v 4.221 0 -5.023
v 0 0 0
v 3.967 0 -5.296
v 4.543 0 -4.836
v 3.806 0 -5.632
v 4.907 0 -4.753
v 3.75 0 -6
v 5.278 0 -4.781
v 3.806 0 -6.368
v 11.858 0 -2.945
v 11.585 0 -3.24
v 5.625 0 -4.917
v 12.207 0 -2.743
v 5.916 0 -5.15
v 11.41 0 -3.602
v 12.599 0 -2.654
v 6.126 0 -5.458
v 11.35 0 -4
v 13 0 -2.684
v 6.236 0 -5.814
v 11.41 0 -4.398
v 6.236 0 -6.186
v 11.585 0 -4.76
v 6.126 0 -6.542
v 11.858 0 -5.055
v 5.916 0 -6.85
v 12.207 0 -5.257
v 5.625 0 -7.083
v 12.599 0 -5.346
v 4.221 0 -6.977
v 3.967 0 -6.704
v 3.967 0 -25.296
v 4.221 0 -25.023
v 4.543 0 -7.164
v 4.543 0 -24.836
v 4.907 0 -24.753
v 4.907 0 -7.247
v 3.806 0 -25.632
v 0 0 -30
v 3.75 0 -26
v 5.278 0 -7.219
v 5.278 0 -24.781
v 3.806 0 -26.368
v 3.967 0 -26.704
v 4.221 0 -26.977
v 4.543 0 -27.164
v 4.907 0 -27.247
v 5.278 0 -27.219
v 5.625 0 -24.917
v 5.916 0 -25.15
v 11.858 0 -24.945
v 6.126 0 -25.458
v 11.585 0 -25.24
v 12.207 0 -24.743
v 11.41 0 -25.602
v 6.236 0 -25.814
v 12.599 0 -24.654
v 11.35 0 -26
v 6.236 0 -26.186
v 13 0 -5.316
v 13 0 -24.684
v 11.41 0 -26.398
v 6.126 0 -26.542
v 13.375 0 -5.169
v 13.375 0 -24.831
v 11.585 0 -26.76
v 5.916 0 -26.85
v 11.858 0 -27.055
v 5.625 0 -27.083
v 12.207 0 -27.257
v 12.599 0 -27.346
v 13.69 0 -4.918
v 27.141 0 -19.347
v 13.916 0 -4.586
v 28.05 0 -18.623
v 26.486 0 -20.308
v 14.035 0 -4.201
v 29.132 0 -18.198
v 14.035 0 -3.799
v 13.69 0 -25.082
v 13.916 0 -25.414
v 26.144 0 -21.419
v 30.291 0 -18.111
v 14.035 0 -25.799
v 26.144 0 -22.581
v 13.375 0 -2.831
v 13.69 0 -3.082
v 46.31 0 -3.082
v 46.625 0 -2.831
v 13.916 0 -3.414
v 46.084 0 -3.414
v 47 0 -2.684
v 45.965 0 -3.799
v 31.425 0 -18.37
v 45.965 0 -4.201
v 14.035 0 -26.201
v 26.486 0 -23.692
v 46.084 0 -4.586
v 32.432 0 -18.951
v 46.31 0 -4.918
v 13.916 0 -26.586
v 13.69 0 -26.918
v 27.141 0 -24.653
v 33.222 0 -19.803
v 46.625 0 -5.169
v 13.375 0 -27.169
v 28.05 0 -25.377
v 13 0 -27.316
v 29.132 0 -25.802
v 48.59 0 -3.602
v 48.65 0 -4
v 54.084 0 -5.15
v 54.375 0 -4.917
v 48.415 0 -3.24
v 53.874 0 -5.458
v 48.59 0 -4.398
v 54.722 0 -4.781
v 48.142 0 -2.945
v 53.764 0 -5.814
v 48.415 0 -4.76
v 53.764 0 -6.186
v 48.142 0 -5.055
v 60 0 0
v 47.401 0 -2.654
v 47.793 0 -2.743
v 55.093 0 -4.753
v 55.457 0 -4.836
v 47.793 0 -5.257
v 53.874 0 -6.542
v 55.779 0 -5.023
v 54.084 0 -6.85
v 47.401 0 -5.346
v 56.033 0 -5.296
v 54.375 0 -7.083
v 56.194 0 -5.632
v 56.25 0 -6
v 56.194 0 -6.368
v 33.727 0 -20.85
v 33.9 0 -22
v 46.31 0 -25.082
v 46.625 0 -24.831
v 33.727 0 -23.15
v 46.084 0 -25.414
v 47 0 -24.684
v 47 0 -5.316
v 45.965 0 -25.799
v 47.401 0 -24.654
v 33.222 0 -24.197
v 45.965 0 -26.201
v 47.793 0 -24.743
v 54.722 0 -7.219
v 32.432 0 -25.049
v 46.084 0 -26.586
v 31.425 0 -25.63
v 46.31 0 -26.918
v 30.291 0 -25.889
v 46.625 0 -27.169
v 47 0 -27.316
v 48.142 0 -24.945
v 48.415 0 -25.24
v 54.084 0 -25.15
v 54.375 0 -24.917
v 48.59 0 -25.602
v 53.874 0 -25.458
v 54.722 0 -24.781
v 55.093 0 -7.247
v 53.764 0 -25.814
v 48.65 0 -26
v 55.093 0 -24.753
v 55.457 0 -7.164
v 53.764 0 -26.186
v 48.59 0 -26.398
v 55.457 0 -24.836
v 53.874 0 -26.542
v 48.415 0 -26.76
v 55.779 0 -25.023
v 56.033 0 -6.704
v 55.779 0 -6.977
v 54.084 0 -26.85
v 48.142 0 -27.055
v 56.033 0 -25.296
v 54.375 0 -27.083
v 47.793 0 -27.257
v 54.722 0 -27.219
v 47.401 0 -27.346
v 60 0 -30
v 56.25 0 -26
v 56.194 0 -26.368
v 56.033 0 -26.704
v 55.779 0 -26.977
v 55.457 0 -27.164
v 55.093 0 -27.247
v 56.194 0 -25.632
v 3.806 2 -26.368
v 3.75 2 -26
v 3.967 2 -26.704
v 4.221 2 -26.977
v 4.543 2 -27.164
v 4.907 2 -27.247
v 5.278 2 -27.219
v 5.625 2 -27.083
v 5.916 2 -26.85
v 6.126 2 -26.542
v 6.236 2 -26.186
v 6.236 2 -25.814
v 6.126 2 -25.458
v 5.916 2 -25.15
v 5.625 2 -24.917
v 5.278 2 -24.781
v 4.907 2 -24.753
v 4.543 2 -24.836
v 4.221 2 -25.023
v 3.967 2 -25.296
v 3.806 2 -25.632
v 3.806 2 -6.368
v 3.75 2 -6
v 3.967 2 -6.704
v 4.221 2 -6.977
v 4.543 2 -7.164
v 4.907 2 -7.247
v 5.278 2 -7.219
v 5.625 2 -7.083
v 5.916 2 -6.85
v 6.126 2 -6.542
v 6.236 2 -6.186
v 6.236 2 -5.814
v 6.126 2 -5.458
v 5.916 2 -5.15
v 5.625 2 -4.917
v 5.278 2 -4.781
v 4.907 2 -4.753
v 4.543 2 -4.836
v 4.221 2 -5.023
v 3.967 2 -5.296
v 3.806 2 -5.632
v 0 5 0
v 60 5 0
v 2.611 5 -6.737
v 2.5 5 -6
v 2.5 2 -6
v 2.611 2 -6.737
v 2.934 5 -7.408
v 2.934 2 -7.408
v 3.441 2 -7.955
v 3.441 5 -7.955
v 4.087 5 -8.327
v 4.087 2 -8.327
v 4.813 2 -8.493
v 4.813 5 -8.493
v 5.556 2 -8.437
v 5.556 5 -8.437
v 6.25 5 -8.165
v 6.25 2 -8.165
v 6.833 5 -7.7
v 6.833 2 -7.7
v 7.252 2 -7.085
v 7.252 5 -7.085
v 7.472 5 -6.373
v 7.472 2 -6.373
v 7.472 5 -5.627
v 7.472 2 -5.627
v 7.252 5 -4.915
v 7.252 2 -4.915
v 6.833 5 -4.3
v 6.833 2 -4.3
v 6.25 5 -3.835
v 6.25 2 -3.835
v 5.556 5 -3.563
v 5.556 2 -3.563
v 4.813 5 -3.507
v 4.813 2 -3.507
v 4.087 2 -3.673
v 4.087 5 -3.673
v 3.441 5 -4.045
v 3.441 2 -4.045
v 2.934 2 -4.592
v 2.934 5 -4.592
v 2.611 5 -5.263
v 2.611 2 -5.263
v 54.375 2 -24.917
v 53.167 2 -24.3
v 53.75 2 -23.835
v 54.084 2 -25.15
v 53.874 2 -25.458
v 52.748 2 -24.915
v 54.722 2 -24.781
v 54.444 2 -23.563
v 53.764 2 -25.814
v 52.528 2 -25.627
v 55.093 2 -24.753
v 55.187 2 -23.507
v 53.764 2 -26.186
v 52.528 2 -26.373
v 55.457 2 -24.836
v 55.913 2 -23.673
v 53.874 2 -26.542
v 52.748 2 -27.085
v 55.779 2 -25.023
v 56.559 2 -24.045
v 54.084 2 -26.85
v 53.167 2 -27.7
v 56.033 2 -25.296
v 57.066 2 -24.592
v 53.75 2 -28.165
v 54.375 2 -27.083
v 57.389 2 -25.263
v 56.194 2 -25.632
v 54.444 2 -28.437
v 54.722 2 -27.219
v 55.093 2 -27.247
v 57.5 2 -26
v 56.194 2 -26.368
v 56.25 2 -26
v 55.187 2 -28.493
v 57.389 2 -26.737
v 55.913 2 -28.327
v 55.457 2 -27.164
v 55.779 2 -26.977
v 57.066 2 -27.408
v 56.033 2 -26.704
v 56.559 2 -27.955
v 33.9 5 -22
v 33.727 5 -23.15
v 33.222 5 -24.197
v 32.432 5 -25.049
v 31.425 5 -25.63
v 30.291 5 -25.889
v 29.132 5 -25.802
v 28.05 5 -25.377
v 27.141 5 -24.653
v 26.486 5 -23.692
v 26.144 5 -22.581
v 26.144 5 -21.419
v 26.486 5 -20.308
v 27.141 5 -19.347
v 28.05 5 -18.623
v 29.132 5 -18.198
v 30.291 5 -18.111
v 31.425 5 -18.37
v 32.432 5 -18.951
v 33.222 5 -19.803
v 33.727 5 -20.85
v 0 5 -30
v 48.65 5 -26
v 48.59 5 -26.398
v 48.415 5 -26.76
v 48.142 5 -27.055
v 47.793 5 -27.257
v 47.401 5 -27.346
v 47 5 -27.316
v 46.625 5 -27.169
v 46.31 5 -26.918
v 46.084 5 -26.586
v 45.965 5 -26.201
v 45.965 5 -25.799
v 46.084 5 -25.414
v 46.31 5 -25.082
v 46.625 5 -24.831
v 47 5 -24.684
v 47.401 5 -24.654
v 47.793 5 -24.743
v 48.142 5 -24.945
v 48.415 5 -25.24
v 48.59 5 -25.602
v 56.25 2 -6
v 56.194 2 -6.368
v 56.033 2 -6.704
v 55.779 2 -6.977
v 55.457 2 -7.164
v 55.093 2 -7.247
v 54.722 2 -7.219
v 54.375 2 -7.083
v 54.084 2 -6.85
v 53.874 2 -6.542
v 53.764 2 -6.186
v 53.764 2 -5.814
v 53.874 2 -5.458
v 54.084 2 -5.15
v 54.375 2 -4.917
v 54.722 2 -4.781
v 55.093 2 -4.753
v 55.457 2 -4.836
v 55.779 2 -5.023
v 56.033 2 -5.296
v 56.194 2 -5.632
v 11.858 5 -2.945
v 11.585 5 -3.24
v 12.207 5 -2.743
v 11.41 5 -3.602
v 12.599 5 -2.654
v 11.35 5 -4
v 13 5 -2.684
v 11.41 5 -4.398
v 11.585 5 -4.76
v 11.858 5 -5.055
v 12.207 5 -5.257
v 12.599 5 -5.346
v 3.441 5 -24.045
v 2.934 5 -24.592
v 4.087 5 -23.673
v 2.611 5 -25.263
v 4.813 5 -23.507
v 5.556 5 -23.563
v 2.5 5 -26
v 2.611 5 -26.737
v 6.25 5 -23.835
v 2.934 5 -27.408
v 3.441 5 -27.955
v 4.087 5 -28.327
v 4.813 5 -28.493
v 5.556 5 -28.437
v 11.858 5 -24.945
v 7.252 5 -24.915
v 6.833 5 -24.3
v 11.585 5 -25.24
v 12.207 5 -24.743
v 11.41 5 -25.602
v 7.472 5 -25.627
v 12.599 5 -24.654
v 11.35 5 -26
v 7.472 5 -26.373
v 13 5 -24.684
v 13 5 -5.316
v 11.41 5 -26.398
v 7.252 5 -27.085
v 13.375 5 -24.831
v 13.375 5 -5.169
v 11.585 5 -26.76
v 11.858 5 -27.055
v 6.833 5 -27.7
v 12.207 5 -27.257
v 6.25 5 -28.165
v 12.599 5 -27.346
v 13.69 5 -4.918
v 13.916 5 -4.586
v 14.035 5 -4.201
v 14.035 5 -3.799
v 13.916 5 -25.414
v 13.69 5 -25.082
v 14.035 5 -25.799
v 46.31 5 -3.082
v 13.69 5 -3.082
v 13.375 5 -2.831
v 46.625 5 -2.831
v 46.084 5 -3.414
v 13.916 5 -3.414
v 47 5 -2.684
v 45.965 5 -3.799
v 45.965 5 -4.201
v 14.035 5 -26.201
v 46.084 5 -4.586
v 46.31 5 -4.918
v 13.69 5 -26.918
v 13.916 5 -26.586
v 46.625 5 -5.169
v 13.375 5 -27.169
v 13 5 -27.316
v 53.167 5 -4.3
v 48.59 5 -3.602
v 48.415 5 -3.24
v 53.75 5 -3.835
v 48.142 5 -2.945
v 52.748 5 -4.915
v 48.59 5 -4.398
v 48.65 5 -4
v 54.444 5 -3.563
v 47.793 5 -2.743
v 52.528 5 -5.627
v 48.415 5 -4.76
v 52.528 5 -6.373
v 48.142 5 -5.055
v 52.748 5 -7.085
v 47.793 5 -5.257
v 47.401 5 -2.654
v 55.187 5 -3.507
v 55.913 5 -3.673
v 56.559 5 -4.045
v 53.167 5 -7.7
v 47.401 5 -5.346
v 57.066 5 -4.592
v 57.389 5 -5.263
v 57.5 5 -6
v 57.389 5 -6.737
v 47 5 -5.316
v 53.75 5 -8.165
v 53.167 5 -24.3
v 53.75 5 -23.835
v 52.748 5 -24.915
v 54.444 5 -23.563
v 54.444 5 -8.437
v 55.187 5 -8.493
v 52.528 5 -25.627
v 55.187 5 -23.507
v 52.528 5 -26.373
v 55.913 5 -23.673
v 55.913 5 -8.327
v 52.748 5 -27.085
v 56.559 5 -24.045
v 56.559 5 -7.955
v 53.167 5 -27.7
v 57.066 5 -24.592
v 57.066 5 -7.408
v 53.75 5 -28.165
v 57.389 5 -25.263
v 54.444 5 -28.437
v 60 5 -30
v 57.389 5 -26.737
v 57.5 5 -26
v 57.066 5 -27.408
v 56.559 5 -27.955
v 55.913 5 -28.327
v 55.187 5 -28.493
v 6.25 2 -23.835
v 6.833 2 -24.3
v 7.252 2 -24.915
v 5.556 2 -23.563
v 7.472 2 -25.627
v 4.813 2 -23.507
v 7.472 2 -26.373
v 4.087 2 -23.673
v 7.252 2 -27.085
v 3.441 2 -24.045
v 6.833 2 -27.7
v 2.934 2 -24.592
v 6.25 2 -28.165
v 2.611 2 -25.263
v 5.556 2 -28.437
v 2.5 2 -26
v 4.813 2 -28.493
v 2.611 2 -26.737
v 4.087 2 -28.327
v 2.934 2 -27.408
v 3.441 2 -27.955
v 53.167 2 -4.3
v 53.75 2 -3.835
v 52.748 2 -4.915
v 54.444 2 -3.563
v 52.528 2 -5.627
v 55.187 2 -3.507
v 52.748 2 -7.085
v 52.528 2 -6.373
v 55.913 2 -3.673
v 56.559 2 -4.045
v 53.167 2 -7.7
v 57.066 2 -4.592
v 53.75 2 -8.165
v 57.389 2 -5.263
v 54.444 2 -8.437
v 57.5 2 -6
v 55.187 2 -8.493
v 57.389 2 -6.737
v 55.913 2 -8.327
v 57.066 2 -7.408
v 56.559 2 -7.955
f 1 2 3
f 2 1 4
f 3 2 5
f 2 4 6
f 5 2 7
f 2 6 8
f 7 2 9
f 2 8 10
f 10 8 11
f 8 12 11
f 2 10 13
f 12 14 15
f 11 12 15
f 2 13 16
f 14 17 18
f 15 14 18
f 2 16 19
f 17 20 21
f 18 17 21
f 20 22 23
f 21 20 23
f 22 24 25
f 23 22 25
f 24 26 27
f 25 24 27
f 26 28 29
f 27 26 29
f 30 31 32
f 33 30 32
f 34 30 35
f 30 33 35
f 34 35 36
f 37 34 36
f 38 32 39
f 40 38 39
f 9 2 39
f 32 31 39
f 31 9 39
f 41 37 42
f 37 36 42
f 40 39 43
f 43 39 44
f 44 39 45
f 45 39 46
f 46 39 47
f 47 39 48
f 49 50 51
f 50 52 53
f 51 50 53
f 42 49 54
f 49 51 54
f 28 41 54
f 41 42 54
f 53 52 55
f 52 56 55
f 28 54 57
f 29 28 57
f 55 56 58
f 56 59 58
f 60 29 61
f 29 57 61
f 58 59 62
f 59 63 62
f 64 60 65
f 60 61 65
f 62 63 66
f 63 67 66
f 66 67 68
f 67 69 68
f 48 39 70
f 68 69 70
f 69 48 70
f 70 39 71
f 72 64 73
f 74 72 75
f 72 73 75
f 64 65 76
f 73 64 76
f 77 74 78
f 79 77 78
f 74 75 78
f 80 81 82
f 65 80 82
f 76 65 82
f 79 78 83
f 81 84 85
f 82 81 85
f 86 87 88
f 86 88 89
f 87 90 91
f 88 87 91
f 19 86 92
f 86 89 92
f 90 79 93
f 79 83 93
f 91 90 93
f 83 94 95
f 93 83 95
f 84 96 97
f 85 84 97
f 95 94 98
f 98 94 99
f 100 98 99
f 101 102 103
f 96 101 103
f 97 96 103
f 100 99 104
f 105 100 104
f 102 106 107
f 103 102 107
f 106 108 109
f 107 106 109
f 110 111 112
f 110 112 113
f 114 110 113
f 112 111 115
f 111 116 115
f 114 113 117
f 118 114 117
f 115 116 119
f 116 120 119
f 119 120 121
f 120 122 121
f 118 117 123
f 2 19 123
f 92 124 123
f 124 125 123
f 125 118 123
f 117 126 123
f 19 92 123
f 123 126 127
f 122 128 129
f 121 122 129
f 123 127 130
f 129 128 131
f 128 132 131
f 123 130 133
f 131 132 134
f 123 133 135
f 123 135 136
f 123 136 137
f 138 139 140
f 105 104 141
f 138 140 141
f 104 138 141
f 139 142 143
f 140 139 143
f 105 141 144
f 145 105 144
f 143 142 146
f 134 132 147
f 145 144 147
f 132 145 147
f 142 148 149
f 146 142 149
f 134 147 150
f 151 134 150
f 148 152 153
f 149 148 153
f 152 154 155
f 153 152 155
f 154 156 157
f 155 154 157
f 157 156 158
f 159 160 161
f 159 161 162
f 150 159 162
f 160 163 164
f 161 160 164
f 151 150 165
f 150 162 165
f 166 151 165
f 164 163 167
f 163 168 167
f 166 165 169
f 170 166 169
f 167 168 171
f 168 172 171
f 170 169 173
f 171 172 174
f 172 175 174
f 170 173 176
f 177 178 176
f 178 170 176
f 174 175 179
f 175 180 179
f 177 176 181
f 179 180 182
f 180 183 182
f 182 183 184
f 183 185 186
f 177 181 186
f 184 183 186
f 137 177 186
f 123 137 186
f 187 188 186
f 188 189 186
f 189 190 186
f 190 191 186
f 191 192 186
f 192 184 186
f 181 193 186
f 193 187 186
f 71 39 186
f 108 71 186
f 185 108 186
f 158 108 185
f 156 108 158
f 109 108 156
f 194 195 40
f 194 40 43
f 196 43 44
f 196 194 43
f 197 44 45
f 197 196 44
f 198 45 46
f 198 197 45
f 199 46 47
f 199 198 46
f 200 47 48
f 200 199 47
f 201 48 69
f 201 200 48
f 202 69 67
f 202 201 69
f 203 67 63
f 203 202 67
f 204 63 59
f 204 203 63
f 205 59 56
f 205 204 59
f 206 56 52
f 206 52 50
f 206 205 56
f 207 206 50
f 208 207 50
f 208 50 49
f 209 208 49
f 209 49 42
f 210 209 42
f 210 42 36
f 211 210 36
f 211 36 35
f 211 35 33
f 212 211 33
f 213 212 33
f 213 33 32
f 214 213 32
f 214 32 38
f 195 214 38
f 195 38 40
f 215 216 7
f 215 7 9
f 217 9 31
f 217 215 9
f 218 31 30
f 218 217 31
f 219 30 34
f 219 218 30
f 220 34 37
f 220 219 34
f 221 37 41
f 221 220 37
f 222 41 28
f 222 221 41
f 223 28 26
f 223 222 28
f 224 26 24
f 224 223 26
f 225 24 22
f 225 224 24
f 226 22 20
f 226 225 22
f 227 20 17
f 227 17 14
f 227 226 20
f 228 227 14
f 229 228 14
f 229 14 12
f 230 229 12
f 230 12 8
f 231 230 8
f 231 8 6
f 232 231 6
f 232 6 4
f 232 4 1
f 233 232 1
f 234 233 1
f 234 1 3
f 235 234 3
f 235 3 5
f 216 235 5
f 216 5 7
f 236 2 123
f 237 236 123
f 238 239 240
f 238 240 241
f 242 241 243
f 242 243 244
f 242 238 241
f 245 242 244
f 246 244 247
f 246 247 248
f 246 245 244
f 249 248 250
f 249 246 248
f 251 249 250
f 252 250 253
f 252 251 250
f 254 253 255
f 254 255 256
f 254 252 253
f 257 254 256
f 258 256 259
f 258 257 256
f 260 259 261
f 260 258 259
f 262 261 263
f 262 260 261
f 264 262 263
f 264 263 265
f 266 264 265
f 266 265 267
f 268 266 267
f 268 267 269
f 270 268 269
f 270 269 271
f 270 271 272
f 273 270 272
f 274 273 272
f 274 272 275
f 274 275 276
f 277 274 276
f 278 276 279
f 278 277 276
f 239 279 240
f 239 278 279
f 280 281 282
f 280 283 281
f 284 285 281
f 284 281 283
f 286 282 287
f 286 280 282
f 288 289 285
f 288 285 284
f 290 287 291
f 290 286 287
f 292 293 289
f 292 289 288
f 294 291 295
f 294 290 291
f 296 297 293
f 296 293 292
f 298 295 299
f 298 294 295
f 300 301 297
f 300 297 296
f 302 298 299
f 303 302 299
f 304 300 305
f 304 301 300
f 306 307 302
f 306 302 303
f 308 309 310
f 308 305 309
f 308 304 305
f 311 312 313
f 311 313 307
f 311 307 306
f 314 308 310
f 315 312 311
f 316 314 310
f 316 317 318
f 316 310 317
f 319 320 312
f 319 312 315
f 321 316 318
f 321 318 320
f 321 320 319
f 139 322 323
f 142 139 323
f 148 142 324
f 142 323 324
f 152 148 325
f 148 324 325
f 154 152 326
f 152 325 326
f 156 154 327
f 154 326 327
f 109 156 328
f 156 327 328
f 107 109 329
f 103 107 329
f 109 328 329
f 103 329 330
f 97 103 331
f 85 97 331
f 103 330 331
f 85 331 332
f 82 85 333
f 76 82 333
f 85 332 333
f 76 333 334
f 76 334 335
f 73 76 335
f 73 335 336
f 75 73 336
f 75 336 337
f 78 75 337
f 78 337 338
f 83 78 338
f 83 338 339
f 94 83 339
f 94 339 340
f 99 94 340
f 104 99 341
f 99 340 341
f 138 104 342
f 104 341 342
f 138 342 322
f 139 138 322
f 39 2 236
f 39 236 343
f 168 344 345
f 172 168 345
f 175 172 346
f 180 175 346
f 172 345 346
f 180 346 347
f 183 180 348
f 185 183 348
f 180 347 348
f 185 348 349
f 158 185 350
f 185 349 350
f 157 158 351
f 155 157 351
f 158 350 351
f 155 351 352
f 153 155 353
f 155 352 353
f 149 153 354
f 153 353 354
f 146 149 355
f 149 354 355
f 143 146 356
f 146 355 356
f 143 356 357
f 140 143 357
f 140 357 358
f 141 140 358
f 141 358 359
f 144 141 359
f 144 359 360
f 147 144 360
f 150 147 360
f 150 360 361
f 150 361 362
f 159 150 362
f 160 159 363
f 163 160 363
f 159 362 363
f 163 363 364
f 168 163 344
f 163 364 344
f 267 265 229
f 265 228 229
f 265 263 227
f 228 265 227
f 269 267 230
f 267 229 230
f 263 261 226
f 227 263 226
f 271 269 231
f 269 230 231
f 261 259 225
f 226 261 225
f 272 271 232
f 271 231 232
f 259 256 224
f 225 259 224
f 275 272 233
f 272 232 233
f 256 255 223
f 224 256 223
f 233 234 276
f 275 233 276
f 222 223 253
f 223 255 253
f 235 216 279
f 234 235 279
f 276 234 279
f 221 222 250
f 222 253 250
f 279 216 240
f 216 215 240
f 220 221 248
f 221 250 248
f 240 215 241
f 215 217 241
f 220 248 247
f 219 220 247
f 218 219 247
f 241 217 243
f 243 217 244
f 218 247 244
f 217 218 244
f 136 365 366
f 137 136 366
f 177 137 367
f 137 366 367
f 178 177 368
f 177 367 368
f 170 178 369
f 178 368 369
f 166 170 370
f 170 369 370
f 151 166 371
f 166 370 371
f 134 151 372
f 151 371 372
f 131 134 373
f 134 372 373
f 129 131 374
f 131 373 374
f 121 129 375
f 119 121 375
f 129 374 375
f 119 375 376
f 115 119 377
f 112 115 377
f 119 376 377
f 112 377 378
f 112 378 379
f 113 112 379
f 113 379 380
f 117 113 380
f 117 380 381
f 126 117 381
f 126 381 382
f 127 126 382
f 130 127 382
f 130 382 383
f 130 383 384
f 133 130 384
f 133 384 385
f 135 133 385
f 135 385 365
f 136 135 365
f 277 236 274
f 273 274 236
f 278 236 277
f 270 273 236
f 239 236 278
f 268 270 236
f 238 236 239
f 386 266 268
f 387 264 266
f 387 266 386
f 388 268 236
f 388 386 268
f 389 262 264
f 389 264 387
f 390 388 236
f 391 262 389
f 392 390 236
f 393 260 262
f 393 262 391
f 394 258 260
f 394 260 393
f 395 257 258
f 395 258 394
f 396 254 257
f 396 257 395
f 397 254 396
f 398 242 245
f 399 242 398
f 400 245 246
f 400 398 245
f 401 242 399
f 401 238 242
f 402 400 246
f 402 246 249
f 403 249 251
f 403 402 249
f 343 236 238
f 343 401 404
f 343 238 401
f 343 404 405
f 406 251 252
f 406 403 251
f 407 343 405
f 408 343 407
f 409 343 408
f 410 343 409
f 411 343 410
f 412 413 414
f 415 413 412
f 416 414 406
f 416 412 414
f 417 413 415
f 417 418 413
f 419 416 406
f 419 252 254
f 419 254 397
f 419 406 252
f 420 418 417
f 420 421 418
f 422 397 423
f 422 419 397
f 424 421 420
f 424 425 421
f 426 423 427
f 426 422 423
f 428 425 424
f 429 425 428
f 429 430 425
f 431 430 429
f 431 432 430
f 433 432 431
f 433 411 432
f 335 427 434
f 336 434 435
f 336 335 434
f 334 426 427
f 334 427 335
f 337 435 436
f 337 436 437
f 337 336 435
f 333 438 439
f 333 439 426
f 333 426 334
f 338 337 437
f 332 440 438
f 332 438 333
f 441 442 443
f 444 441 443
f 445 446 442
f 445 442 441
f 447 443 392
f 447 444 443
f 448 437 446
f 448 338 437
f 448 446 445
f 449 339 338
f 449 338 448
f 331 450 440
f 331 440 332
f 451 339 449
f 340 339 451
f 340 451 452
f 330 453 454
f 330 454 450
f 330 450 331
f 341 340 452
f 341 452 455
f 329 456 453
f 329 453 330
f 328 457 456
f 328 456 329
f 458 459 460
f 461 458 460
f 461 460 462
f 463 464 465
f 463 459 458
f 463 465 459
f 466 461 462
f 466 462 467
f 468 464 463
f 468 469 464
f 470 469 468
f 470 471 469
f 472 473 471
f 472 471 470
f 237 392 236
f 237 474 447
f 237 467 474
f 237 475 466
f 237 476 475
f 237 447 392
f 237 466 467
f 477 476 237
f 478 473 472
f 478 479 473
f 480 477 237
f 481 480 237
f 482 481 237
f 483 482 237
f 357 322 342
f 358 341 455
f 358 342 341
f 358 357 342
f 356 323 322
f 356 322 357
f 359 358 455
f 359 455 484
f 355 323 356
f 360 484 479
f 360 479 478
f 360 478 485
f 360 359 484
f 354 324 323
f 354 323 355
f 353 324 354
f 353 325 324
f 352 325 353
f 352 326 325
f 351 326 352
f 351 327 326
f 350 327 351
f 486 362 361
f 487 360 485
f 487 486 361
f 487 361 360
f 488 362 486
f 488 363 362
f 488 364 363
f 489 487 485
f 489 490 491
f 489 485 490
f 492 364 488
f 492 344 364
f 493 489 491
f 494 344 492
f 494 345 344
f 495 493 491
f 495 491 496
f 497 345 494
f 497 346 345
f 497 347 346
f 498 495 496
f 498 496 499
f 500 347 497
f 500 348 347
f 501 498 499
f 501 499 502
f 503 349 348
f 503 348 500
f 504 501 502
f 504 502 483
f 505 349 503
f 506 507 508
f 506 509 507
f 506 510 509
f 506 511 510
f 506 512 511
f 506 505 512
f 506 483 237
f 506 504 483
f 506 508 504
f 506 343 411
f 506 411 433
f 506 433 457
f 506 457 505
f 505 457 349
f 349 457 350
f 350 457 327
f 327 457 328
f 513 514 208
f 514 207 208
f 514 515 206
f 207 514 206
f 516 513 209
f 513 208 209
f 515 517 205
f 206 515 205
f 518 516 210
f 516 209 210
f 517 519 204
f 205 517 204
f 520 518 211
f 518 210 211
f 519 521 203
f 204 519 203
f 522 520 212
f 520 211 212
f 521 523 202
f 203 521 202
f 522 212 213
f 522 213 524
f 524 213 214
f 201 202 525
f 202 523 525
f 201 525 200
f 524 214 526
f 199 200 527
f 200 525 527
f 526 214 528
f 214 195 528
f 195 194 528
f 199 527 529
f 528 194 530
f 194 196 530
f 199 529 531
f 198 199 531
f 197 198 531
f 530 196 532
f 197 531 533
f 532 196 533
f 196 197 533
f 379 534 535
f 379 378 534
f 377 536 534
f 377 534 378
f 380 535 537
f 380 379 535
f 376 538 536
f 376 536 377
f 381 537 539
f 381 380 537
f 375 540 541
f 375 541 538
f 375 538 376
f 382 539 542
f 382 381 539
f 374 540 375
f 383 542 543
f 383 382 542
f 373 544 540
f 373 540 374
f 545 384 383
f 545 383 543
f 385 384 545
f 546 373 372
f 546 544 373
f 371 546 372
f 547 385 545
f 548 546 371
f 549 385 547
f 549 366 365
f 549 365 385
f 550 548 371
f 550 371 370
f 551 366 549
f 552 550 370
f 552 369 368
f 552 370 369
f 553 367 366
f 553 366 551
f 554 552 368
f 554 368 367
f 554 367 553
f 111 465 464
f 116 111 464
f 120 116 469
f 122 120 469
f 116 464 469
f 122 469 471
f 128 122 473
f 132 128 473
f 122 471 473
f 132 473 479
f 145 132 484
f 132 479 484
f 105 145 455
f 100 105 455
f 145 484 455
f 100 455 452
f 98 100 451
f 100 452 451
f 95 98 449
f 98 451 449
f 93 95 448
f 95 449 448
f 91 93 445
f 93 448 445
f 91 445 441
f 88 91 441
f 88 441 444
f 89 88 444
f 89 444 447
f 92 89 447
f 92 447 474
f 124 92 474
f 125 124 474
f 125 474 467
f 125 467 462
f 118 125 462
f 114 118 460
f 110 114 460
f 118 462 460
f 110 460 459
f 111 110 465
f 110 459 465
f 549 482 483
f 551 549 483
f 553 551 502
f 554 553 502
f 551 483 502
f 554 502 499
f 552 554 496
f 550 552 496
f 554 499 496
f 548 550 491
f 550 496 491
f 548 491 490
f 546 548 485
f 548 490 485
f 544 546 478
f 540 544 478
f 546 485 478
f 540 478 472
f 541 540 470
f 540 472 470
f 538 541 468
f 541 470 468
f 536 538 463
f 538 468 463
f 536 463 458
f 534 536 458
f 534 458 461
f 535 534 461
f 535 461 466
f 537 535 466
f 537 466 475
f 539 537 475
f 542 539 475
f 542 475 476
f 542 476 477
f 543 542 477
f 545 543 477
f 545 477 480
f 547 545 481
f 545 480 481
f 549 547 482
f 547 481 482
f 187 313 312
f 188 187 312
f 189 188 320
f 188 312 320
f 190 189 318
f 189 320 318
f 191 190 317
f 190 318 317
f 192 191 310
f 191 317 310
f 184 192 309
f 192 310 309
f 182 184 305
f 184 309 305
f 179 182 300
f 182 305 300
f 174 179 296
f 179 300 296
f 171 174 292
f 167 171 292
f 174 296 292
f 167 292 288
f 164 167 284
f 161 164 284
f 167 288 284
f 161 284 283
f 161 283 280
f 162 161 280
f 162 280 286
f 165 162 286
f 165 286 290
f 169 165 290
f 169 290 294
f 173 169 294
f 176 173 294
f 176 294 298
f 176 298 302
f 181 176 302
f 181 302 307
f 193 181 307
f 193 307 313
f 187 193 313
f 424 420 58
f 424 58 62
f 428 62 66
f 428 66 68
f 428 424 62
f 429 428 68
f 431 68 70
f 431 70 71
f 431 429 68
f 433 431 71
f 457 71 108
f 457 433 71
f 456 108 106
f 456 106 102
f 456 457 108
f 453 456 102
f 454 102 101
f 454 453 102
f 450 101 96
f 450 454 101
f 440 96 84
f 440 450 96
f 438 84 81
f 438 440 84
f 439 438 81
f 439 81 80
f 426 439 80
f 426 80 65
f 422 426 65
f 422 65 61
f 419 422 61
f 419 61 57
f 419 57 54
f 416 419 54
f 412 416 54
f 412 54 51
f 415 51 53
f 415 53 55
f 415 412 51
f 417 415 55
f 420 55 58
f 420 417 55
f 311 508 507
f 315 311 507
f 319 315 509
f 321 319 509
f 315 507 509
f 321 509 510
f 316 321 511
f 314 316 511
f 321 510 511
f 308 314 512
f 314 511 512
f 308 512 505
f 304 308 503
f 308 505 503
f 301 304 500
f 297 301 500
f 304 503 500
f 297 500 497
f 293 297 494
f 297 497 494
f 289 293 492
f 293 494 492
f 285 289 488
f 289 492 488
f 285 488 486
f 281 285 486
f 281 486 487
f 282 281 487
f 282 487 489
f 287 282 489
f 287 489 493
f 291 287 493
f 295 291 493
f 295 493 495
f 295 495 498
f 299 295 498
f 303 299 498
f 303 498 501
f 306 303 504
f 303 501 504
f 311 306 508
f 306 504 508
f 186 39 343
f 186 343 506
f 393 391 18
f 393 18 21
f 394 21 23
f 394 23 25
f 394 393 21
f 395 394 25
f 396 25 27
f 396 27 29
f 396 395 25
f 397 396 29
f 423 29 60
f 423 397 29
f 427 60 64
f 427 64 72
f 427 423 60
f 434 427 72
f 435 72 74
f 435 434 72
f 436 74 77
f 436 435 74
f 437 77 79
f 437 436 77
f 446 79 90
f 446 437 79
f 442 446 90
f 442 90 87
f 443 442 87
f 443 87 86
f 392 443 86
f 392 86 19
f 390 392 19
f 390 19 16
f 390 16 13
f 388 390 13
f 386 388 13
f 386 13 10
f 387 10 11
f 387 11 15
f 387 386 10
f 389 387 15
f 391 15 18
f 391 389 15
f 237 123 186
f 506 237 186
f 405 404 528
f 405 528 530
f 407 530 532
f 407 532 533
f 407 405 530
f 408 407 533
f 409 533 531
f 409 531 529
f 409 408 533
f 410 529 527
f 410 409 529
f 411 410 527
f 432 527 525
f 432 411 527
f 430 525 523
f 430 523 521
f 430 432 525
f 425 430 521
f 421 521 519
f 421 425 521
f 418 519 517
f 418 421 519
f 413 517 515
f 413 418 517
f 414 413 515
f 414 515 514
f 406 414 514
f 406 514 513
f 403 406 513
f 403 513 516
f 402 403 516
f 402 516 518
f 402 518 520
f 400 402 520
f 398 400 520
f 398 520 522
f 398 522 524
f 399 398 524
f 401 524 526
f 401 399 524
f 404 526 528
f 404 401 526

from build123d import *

# Parameters (mm, degrees)
SKETCH1_W           = 60
SKETCH1_H           = 30
BOSS_EXTRUDE1_DEPTH = 5
SKETCH3_R           = 3.9
SKETCH3_R_2         = 1.35
CUT_EXTRUDE1_DEPTH  = 5
SKETCH4_R           = 1.25
CUT_EXTRUDE2_DEPTH  = 5
SKETCH5_R           = 2.5
CUT_EXTRUDE3_DEPTH  = 3


with BuildPart() as part:
    # Sketch1 → Boss-Extrude1 (new body)
    with BuildSketch(Plane(origin=(0, 0, 0), x_dir=(1, 0, 0), z_dir=(0, 1, 0))):
        with Locations((30, 15)):
            Rectangle(SKETCH1_W, SKETCH1_H)
    extrude(amount=BOSS_EXTRUDE1_DEPTH)

    # Sketch3 → Cut-Extrude1 (cut)
    with BuildSketch(Plane(origin=(0, 5, 0), x_dir=(1, 0, 0), z_dir=(0, 1, 0))):
        with Locations((30, 22)):
            Circle(SKETCH3_R)
        with Locations((47.3, 4)):
            Circle(SKETCH3_R_2)
        with Locations((47.3, 26)):
            Circle(SKETCH3_R_2)
    cut_extrude1 = extrude(amount=-CUT_EXTRUDE1_DEPTH, mode=Mode.SUBTRACT)

    # Mirror1: Cut-Extrude1 across plane
    add(cut_extrude1.mirror(Plane.ZY.offset(-30)), mode=Mode.SUBTRACT)

    # Sketch4 → Cut-Extrude2 (cut)
    with BuildSketch(Plane(origin=(0, 5, 0), x_dir=(1, 0, 0), z_dir=(0, 1, 0))):
        with Locations((55, 26)):
            Circle(SKETCH4_R)
        with Locations((55, 6)):
            Circle(SKETCH4_R)
    cut_extrude2 = extrude(amount=-CUT_EXTRUDE2_DEPTH, mode=Mode.SUBTRACT)

    # Mirror2: Cut-Extrude2 across plane
    add(cut_extrude2.mirror(Plane.ZY.offset(-30)), mode=Mode.SUBTRACT)

    # Sketch5 → Cut-Extrude3 (cut)
    with BuildSketch(Plane(origin=(0, 5, 0), x_dir=(1, 0, 0), z_dir=(0, 1, 0))):
        with Locations((55, 26)):
            Circle(SKETCH5_R)
        with Locations((55, 6)):
            Circle(SKETCH5_R)
    cut_extrude3 = extrude(amount=-CUT_EXTRUDE3_DEPTH, mode=Mode.SUBTRACT)

    # Mirror3: Cut-Extrude3 across plane
    add(cut_extrude3.mirror(Plane.ZY.offset(-30)), mode=Mode.SUBTRACT)


solid = part.part
